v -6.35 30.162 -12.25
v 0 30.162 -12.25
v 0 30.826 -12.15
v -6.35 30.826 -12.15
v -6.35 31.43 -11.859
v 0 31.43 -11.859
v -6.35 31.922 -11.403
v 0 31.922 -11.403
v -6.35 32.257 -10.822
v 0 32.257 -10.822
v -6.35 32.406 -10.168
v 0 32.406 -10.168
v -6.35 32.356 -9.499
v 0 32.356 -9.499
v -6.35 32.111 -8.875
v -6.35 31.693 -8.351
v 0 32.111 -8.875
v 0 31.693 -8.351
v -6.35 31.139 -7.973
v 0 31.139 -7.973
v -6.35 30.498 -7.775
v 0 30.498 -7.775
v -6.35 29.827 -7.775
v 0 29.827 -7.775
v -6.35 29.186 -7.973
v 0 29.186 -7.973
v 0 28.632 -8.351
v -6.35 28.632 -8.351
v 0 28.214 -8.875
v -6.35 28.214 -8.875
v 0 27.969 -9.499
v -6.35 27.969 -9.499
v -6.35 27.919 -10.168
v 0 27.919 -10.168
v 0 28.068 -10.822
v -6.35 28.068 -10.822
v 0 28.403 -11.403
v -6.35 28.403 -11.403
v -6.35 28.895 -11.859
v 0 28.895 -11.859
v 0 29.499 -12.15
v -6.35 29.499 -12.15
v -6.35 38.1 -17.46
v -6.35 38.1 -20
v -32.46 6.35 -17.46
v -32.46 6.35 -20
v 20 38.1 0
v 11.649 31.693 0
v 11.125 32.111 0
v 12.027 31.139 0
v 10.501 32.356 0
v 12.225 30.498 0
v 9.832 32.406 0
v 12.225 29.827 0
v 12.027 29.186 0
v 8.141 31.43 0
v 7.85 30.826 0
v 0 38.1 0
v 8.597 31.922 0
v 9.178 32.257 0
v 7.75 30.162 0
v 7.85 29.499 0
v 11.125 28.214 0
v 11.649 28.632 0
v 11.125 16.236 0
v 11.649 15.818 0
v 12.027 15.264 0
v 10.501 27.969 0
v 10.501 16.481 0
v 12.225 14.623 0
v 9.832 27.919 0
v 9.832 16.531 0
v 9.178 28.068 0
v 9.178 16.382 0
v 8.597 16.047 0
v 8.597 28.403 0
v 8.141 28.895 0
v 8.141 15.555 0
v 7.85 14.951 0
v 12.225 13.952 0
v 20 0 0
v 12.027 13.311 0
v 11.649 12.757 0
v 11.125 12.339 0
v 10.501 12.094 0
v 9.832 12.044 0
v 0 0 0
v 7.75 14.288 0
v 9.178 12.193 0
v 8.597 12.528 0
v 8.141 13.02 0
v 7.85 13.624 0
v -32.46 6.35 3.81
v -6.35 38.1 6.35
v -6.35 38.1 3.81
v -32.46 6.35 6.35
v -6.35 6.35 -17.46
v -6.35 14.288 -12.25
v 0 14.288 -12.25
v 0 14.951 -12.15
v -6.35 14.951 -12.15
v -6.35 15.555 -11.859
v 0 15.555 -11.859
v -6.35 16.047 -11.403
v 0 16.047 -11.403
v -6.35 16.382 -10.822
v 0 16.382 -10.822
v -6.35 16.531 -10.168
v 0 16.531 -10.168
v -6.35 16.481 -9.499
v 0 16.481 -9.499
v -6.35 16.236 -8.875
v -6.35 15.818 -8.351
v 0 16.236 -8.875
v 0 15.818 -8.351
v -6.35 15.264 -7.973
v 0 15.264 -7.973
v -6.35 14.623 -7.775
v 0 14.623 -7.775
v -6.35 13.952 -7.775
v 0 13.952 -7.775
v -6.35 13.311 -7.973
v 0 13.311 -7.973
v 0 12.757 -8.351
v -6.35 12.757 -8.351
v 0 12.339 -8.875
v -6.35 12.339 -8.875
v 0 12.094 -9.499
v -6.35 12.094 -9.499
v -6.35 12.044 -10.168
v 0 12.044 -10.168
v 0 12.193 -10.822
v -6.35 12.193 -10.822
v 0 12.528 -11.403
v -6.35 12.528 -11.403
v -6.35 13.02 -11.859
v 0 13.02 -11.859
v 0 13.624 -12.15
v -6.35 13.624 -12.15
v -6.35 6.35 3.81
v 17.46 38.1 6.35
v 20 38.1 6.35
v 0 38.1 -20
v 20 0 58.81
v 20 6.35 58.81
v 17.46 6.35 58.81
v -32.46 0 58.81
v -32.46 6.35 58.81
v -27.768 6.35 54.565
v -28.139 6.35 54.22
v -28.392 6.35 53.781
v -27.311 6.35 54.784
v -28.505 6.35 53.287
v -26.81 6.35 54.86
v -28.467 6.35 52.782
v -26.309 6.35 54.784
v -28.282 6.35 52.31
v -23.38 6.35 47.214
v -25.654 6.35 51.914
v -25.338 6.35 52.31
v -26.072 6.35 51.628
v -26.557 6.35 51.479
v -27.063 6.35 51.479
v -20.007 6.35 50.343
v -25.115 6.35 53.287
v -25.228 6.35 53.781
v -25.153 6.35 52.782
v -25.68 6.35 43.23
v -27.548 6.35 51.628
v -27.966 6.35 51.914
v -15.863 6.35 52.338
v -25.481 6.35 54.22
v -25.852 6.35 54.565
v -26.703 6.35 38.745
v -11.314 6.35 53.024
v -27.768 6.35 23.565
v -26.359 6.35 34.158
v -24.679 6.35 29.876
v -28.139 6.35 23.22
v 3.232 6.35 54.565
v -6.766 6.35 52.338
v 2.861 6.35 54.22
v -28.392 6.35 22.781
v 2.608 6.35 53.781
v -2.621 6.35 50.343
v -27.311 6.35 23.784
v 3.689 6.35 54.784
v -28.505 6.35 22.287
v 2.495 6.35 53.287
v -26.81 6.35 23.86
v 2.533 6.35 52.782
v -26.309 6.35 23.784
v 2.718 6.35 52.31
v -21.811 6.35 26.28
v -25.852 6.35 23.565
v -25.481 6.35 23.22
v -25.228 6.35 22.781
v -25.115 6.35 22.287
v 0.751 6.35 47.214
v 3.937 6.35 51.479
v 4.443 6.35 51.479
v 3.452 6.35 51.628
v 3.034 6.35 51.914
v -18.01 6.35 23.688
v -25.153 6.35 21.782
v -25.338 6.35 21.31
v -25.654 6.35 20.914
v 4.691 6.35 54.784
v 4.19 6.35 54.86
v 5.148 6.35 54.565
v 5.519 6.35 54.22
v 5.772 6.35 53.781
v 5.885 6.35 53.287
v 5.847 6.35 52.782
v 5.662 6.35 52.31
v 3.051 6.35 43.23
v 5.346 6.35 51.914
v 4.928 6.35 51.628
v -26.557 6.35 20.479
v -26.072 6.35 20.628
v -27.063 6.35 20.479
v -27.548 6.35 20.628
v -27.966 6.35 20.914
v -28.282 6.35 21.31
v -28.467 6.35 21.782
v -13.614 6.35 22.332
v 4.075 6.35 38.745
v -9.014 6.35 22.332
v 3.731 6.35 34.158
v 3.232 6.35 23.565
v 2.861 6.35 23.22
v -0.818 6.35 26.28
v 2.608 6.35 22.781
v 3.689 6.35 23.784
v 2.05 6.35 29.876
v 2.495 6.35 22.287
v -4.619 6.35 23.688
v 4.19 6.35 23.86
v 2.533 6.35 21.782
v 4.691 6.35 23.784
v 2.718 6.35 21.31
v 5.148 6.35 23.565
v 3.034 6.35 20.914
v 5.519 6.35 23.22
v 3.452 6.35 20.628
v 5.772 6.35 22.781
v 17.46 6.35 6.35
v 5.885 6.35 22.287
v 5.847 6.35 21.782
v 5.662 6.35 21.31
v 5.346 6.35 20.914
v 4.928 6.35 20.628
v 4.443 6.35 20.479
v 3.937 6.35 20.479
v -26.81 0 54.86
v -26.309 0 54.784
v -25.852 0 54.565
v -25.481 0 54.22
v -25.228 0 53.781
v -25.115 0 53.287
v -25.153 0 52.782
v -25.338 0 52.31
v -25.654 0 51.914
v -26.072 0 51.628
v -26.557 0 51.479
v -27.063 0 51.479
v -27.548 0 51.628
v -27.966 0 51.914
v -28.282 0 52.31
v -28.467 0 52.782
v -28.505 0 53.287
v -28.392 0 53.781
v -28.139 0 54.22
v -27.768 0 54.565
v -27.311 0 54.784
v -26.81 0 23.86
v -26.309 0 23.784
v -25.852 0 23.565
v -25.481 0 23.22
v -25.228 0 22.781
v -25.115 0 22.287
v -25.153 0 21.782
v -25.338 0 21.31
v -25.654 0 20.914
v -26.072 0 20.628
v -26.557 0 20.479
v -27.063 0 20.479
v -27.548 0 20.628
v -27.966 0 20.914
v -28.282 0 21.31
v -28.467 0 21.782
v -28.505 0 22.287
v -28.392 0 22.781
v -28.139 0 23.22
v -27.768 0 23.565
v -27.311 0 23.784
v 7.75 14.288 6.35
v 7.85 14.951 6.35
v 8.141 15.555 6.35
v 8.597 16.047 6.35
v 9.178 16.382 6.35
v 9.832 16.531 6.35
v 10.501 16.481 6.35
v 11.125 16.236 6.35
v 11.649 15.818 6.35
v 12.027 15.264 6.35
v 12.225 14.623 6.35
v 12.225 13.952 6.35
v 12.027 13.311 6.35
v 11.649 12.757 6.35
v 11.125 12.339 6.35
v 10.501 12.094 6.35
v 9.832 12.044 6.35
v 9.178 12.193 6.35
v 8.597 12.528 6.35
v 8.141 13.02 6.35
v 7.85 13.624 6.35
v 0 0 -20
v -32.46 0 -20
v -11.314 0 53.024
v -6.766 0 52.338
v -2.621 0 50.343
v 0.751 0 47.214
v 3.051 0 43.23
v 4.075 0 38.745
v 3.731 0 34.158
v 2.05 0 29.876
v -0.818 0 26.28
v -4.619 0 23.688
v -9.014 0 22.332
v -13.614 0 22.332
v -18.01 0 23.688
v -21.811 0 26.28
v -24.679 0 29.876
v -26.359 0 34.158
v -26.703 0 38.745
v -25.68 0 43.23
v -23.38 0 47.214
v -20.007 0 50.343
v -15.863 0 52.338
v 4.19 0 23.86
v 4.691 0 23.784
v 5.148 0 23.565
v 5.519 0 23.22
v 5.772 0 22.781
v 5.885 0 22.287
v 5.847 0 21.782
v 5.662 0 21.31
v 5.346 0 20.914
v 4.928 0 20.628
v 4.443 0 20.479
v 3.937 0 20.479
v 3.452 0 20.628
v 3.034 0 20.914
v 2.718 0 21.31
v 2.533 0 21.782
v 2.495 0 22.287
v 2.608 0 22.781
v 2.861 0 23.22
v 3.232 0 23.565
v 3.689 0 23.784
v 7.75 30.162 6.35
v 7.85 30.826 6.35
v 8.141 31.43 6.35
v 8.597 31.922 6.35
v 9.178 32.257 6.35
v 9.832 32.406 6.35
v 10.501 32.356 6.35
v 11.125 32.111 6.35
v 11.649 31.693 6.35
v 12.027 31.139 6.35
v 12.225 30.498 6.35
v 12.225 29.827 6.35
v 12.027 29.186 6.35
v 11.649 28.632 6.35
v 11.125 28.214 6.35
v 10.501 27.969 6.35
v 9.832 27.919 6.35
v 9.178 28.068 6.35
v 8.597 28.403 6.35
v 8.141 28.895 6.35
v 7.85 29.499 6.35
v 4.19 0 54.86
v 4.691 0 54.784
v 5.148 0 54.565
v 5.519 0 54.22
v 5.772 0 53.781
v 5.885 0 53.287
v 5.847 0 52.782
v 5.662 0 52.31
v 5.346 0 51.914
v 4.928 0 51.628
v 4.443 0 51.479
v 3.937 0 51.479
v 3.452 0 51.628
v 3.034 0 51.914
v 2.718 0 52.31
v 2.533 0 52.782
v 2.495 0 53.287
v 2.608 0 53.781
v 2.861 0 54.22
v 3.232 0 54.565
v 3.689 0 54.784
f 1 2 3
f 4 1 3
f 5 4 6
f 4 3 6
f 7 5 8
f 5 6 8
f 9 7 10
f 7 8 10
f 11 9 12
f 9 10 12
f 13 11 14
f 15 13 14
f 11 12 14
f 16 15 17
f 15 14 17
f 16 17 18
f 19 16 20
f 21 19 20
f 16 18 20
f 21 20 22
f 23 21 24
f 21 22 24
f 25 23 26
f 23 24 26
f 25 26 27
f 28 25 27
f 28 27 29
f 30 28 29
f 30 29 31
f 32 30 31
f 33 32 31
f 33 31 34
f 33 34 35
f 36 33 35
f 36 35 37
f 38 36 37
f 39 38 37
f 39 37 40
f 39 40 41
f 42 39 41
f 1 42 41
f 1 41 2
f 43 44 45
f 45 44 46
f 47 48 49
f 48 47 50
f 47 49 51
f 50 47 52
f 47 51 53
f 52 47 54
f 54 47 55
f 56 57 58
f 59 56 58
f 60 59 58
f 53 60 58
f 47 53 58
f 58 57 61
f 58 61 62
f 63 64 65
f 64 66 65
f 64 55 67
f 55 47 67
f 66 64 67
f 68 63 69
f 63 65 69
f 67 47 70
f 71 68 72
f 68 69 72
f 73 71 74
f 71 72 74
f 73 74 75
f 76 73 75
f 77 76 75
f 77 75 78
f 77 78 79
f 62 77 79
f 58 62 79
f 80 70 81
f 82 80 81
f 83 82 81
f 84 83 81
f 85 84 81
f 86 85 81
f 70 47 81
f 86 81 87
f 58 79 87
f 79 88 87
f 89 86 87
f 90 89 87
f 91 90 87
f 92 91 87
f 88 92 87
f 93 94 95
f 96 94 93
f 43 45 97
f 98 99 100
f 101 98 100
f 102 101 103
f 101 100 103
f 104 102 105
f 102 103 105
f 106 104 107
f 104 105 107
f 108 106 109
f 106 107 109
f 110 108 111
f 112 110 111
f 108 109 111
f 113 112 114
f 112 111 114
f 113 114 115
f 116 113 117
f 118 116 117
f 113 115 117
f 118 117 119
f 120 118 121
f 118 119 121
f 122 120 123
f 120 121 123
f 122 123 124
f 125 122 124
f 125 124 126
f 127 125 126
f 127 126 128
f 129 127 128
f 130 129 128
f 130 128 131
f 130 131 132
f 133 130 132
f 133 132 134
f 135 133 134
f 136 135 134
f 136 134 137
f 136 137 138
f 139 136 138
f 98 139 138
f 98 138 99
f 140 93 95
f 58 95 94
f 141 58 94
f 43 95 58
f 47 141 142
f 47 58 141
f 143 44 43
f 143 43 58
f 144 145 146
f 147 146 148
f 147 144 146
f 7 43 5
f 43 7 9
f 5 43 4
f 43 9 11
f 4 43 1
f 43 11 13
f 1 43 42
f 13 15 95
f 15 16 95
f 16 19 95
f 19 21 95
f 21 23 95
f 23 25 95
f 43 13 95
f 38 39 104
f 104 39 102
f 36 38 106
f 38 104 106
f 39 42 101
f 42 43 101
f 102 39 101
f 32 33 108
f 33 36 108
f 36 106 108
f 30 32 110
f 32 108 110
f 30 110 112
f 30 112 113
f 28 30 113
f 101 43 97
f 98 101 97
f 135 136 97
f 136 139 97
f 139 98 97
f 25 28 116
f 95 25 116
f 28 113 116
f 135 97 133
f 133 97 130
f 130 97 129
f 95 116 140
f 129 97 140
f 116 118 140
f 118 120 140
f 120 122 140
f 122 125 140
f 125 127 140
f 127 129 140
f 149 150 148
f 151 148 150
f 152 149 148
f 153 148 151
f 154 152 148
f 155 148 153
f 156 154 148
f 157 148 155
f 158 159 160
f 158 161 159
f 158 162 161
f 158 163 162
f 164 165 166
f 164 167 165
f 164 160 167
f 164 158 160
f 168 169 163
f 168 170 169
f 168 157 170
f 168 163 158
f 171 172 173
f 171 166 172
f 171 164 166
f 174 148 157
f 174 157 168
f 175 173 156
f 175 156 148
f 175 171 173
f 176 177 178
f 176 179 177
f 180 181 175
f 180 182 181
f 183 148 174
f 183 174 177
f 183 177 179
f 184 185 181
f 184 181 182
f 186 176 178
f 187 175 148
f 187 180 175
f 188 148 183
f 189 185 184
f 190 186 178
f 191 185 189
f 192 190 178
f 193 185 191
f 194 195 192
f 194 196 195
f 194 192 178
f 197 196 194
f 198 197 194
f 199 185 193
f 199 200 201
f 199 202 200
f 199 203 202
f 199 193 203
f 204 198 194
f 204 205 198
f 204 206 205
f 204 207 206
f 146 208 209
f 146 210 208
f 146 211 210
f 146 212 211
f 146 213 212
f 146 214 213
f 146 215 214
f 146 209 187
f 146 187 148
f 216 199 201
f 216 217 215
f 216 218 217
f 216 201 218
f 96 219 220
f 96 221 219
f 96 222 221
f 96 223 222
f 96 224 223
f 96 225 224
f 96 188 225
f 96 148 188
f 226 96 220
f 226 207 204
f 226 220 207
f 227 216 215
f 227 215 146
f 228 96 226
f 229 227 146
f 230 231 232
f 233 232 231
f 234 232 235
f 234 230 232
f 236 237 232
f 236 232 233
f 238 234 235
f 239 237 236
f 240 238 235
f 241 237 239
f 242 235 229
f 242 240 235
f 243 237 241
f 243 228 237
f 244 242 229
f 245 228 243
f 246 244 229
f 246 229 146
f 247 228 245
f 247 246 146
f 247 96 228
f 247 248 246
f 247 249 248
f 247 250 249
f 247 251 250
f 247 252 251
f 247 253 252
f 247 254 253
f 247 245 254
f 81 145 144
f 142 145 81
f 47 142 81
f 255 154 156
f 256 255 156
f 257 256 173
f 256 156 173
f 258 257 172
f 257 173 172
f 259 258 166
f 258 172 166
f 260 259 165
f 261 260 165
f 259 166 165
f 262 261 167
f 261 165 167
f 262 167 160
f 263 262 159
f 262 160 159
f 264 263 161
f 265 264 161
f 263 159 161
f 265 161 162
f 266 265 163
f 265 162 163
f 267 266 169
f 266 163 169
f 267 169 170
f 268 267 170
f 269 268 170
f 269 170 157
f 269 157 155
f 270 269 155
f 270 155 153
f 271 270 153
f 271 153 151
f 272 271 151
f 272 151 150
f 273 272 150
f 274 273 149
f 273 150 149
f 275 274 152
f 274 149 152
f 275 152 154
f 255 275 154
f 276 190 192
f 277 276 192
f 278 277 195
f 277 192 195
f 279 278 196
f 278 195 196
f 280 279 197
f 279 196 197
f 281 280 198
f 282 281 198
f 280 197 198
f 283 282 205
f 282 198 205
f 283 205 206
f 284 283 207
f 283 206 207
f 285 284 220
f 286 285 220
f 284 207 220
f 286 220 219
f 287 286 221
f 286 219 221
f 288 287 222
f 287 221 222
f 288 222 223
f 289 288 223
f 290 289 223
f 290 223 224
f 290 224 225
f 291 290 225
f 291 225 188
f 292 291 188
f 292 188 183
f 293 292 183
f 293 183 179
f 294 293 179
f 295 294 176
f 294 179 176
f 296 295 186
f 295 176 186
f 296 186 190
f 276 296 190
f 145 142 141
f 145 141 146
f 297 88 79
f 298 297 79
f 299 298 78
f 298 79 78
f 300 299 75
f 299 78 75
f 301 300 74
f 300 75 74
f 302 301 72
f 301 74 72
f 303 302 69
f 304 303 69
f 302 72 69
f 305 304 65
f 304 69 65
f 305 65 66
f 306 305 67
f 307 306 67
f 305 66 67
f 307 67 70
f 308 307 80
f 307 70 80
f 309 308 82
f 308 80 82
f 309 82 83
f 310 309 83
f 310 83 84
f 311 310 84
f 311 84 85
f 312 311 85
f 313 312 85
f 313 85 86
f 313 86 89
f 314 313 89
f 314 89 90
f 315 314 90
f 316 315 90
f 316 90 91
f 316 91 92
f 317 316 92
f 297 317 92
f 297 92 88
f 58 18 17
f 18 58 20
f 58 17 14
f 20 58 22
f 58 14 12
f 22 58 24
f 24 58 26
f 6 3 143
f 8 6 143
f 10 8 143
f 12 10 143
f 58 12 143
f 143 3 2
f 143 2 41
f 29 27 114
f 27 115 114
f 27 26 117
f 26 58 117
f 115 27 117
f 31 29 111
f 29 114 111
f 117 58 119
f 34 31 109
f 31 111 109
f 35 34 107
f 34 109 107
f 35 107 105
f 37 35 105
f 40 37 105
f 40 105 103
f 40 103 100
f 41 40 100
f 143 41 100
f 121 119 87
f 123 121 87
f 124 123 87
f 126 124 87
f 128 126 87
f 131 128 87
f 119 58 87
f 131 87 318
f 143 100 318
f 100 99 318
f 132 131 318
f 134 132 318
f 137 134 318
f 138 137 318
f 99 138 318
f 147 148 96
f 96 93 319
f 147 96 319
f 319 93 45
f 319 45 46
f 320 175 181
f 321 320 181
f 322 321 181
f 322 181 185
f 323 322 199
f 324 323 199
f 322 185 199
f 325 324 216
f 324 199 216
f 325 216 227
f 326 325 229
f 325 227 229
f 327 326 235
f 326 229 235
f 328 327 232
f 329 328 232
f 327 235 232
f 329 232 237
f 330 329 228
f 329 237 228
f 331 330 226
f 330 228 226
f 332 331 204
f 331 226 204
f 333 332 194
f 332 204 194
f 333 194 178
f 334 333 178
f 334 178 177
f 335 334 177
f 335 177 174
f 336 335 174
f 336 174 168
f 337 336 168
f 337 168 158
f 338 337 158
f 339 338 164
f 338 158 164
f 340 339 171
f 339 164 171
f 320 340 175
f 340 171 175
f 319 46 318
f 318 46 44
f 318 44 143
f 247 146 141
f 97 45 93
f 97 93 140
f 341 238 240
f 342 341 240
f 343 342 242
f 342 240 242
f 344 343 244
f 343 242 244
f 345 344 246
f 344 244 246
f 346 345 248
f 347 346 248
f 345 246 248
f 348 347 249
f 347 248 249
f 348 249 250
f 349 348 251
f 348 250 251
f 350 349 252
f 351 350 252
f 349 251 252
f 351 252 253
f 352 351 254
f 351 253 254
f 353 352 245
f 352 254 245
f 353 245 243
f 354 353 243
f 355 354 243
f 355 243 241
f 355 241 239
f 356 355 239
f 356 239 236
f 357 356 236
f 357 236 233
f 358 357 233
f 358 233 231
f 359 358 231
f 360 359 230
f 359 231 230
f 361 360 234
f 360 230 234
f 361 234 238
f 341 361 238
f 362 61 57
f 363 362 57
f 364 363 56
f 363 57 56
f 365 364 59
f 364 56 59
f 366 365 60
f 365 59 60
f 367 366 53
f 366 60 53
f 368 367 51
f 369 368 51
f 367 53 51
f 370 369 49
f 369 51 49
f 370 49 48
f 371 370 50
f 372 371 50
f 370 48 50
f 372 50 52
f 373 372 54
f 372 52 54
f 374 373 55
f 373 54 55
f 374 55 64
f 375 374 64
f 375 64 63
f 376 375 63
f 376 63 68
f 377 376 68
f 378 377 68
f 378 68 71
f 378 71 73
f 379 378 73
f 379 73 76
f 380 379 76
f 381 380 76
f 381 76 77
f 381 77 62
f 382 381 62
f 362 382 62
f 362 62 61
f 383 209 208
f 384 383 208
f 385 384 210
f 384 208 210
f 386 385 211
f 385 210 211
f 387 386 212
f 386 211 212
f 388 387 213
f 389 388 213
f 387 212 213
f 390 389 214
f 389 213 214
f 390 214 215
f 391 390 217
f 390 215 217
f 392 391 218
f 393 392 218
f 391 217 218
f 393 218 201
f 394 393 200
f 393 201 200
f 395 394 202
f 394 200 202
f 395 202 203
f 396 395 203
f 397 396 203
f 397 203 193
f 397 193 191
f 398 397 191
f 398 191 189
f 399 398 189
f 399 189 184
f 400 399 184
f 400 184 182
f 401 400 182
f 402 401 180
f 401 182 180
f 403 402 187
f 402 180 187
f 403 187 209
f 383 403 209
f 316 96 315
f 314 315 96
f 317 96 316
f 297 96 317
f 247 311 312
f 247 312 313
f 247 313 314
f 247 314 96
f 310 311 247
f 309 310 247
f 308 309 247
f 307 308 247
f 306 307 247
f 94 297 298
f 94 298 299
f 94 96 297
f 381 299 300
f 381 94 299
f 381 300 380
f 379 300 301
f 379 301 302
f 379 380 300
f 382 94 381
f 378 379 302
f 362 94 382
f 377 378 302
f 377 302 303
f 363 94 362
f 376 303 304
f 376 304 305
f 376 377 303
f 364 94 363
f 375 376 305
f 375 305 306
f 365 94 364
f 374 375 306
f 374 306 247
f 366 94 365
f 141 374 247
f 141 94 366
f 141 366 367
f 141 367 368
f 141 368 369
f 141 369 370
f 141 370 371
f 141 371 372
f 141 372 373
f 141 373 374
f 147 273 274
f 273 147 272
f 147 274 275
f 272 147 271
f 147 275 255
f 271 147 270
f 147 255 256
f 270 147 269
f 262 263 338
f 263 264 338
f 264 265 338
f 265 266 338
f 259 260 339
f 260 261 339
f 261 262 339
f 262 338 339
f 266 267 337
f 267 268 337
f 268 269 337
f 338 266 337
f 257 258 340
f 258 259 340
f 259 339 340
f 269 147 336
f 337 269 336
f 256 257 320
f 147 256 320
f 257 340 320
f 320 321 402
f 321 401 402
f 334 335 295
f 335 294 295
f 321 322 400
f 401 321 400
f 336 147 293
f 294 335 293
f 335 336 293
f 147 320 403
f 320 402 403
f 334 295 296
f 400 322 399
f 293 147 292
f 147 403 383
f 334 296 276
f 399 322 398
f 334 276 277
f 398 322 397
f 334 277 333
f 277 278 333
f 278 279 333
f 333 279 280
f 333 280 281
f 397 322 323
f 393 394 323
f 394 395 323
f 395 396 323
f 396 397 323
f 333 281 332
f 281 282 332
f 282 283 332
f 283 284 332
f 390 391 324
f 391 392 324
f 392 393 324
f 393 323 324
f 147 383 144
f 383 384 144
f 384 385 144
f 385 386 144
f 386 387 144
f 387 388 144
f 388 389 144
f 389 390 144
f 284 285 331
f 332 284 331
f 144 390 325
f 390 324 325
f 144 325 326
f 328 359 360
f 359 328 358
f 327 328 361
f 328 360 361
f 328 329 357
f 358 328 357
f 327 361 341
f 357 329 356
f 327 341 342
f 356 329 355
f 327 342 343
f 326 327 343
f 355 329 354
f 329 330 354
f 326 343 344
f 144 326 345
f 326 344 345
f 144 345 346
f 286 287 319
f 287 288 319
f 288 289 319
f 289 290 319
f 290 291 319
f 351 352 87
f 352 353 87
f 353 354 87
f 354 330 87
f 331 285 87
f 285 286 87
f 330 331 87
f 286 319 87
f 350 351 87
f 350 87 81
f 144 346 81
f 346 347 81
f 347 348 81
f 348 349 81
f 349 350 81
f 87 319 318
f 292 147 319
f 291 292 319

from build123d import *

# Parameters (mm, degrees)
SKETCH1_W            = 20
SKETCH1_H            = 6.35
SKETCH1_W_2          = 6.35
SKETCH1_H_2          = 20
BOSS_EXTRUDE1_DEPTH  = 38.1
SKETCH2_W            = 42.3
SKETCH2_H            = 10.16
SKETCH2_W_2          = 15.95
SKETCH2_H_2          = 26.35
SKETCH2_W_3          = 10.16
SKETCH2_H_3          = 52.46
BOSS_EXTRUDE3_DEPTH  = 6.35
SKETCH3_R            = 1.7
SKETCH3_R_2          = 15.431993428
CUT_EXTRUDE1_DEPTH   = 6.35
BOSS_EXTRUDE5_DEPTH  = 2.54
SKETCH6_W            = 10.16
SKETCH6_H            = 26.35
BOSS_EXTRUDE6_DEPTH  = 6.35
BOSS_EXTRUDE7_DEPTH  = 2.54
BOSS_EXTRUDE8_DEPTH  = 2.54
M4_CLEARANCE_HOLE2_D = 4.5
M4_CLEARANCE_HOLE3_D = 4.5


with BuildPart() as part:
    # Sketch1 → Boss-Extrude1 (new body)
    with BuildSketch(Plane(origin=(0, 0, 0), x_dir=(1, 0, 0), z_dir=(0, 1, 0))):
        with Locations((10, -3.175)):
            Rectangle(SKETCH1_W, SKETCH1_H)
        with Locations((-3.175, -3.175)):
            Rectangle(SKETCH1_W_2, SKETCH1_H)
        with Locations((-3.175, 10)):
            Rectangle(SKETCH1_W_2, SKETCH1_H_2)
    extrude(amount=BOSS_EXTRUDE1_DEPTH)

    # Sketch2 → Boss-Extrude3 (add)
    with BuildSketch(Plane.XZ):
        Polygon((-6.35, 6.35), (20, 6.35), (20, 48.65), (-22.3, 48.65), (-22.3, 6.35), align=None)
        with Locations((-1.15, 53.73)):
            Rectangle(SKETCH2_W, SKETCH2_H)
        with Locations((-14.325, -6.825)):
            Rectangle(SKETCH2_W_2, SKETCH2_H_2)
        with Locations((-27.38, 32.58)):
            Rectangle(SKETCH2_W_3, SKETCH2_H_3)
    extrude(amount=-BOSS_EXTRUDE3_DEPTH)

    # Sketch3 → Cut-Extrude1 (cut)
    with BuildSketch(Plane(origin=(0, 6.35, 0), x_dir=(1, 0, 0), z_dir=(0, 1, 0))):
        with Locations(Location((4.19, -22.16, 0), (0, 0, 270))):
            Circle(SKETCH3_R)
        with Locations(Location((-26.81, -53.16, 0), (0, 0, 270))):
            Circle(SKETCH3_R)
        with Locations(Location((-26.81, -22.16, 0), (0, 0, 270))):
            Circle(SKETCH3_R)
        with Locations(Location((-11.314321333, -37.591993428, 0), (0, 0, 270))):
            Circle(SKETCH3_R_2)
        with Locations(Location((4.19, -53.16, 0), (0, 0, 270))):
            Circle(SKETCH3_R)
    extrude(amount=-CUT_EXTRUDE1_DEPTH, mode=Mode.SUBTRACT)

    # Sketch5 → Boss-Extrude5 (add)
    with BuildSketch(Plane(origin=(20, 0, 0), x_dir=(0, 0, -1), z_dir=(1, 0, 0))):
        Polygon((-6.35, 38.1), (-58.81, 6.35), (-6.35, 6.35), align=None)
    extrude(amount=-BOSS_EXTRUDE5_DEPTH)

    # Sketch6 → Boss-Extrude6 (add)
    with BuildSketch(Plane(origin=(0, 6.35, 0), x_dir=(1, 0, 0), z_dir=(0, 1, 0))):
        with Locations((-27.38, 6.825)):
            Rectangle(SKETCH6_W, SKETCH6_H)
    extrude(amount=-BOSS_EXTRUDE6_DEPTH)

    # Sketch7 → Boss-Extrude7 (add)
    with BuildSketch(Plane(origin=(0, 0, -20), x_dir=(-1, 0, 0), z_dir=(0, 0, -1))):
        Polygon((6.35, 38.1), (32.46, 6.35), (6.35, 6.35), align=None)
    extrude(amount=-BOSS_EXTRUDE7_DEPTH)

    # Sketch8 → Boss-Extrude8 (add)
    with BuildSketch(Plane.XY.offset(6.35)):
        Polygon((-6.35, 38.1), (-32.46, 6.35), (-6.35, 6.35), align=None)
    extrude(amount=-BOSS_EXTRUDE8_DEPTH)

    # M4 Clearance Hole2 (through all)
    with Locations(Plane.ZY.offset(6.35)):
        with Locations((-10, 30.1625), (-10, 14.2875)):
            Hole(M4_CLEARANCE_HOLE2_D / 2)

    # M4 Clearance Hole3 (through all)
    with Locations(Plane.XY.offset(6.35)):
        with Locations((10, 30.1625), (10, 14.2875)):
            Hole(M4_CLEARANCE_HOLE3_D / 2)


solid = part.part
